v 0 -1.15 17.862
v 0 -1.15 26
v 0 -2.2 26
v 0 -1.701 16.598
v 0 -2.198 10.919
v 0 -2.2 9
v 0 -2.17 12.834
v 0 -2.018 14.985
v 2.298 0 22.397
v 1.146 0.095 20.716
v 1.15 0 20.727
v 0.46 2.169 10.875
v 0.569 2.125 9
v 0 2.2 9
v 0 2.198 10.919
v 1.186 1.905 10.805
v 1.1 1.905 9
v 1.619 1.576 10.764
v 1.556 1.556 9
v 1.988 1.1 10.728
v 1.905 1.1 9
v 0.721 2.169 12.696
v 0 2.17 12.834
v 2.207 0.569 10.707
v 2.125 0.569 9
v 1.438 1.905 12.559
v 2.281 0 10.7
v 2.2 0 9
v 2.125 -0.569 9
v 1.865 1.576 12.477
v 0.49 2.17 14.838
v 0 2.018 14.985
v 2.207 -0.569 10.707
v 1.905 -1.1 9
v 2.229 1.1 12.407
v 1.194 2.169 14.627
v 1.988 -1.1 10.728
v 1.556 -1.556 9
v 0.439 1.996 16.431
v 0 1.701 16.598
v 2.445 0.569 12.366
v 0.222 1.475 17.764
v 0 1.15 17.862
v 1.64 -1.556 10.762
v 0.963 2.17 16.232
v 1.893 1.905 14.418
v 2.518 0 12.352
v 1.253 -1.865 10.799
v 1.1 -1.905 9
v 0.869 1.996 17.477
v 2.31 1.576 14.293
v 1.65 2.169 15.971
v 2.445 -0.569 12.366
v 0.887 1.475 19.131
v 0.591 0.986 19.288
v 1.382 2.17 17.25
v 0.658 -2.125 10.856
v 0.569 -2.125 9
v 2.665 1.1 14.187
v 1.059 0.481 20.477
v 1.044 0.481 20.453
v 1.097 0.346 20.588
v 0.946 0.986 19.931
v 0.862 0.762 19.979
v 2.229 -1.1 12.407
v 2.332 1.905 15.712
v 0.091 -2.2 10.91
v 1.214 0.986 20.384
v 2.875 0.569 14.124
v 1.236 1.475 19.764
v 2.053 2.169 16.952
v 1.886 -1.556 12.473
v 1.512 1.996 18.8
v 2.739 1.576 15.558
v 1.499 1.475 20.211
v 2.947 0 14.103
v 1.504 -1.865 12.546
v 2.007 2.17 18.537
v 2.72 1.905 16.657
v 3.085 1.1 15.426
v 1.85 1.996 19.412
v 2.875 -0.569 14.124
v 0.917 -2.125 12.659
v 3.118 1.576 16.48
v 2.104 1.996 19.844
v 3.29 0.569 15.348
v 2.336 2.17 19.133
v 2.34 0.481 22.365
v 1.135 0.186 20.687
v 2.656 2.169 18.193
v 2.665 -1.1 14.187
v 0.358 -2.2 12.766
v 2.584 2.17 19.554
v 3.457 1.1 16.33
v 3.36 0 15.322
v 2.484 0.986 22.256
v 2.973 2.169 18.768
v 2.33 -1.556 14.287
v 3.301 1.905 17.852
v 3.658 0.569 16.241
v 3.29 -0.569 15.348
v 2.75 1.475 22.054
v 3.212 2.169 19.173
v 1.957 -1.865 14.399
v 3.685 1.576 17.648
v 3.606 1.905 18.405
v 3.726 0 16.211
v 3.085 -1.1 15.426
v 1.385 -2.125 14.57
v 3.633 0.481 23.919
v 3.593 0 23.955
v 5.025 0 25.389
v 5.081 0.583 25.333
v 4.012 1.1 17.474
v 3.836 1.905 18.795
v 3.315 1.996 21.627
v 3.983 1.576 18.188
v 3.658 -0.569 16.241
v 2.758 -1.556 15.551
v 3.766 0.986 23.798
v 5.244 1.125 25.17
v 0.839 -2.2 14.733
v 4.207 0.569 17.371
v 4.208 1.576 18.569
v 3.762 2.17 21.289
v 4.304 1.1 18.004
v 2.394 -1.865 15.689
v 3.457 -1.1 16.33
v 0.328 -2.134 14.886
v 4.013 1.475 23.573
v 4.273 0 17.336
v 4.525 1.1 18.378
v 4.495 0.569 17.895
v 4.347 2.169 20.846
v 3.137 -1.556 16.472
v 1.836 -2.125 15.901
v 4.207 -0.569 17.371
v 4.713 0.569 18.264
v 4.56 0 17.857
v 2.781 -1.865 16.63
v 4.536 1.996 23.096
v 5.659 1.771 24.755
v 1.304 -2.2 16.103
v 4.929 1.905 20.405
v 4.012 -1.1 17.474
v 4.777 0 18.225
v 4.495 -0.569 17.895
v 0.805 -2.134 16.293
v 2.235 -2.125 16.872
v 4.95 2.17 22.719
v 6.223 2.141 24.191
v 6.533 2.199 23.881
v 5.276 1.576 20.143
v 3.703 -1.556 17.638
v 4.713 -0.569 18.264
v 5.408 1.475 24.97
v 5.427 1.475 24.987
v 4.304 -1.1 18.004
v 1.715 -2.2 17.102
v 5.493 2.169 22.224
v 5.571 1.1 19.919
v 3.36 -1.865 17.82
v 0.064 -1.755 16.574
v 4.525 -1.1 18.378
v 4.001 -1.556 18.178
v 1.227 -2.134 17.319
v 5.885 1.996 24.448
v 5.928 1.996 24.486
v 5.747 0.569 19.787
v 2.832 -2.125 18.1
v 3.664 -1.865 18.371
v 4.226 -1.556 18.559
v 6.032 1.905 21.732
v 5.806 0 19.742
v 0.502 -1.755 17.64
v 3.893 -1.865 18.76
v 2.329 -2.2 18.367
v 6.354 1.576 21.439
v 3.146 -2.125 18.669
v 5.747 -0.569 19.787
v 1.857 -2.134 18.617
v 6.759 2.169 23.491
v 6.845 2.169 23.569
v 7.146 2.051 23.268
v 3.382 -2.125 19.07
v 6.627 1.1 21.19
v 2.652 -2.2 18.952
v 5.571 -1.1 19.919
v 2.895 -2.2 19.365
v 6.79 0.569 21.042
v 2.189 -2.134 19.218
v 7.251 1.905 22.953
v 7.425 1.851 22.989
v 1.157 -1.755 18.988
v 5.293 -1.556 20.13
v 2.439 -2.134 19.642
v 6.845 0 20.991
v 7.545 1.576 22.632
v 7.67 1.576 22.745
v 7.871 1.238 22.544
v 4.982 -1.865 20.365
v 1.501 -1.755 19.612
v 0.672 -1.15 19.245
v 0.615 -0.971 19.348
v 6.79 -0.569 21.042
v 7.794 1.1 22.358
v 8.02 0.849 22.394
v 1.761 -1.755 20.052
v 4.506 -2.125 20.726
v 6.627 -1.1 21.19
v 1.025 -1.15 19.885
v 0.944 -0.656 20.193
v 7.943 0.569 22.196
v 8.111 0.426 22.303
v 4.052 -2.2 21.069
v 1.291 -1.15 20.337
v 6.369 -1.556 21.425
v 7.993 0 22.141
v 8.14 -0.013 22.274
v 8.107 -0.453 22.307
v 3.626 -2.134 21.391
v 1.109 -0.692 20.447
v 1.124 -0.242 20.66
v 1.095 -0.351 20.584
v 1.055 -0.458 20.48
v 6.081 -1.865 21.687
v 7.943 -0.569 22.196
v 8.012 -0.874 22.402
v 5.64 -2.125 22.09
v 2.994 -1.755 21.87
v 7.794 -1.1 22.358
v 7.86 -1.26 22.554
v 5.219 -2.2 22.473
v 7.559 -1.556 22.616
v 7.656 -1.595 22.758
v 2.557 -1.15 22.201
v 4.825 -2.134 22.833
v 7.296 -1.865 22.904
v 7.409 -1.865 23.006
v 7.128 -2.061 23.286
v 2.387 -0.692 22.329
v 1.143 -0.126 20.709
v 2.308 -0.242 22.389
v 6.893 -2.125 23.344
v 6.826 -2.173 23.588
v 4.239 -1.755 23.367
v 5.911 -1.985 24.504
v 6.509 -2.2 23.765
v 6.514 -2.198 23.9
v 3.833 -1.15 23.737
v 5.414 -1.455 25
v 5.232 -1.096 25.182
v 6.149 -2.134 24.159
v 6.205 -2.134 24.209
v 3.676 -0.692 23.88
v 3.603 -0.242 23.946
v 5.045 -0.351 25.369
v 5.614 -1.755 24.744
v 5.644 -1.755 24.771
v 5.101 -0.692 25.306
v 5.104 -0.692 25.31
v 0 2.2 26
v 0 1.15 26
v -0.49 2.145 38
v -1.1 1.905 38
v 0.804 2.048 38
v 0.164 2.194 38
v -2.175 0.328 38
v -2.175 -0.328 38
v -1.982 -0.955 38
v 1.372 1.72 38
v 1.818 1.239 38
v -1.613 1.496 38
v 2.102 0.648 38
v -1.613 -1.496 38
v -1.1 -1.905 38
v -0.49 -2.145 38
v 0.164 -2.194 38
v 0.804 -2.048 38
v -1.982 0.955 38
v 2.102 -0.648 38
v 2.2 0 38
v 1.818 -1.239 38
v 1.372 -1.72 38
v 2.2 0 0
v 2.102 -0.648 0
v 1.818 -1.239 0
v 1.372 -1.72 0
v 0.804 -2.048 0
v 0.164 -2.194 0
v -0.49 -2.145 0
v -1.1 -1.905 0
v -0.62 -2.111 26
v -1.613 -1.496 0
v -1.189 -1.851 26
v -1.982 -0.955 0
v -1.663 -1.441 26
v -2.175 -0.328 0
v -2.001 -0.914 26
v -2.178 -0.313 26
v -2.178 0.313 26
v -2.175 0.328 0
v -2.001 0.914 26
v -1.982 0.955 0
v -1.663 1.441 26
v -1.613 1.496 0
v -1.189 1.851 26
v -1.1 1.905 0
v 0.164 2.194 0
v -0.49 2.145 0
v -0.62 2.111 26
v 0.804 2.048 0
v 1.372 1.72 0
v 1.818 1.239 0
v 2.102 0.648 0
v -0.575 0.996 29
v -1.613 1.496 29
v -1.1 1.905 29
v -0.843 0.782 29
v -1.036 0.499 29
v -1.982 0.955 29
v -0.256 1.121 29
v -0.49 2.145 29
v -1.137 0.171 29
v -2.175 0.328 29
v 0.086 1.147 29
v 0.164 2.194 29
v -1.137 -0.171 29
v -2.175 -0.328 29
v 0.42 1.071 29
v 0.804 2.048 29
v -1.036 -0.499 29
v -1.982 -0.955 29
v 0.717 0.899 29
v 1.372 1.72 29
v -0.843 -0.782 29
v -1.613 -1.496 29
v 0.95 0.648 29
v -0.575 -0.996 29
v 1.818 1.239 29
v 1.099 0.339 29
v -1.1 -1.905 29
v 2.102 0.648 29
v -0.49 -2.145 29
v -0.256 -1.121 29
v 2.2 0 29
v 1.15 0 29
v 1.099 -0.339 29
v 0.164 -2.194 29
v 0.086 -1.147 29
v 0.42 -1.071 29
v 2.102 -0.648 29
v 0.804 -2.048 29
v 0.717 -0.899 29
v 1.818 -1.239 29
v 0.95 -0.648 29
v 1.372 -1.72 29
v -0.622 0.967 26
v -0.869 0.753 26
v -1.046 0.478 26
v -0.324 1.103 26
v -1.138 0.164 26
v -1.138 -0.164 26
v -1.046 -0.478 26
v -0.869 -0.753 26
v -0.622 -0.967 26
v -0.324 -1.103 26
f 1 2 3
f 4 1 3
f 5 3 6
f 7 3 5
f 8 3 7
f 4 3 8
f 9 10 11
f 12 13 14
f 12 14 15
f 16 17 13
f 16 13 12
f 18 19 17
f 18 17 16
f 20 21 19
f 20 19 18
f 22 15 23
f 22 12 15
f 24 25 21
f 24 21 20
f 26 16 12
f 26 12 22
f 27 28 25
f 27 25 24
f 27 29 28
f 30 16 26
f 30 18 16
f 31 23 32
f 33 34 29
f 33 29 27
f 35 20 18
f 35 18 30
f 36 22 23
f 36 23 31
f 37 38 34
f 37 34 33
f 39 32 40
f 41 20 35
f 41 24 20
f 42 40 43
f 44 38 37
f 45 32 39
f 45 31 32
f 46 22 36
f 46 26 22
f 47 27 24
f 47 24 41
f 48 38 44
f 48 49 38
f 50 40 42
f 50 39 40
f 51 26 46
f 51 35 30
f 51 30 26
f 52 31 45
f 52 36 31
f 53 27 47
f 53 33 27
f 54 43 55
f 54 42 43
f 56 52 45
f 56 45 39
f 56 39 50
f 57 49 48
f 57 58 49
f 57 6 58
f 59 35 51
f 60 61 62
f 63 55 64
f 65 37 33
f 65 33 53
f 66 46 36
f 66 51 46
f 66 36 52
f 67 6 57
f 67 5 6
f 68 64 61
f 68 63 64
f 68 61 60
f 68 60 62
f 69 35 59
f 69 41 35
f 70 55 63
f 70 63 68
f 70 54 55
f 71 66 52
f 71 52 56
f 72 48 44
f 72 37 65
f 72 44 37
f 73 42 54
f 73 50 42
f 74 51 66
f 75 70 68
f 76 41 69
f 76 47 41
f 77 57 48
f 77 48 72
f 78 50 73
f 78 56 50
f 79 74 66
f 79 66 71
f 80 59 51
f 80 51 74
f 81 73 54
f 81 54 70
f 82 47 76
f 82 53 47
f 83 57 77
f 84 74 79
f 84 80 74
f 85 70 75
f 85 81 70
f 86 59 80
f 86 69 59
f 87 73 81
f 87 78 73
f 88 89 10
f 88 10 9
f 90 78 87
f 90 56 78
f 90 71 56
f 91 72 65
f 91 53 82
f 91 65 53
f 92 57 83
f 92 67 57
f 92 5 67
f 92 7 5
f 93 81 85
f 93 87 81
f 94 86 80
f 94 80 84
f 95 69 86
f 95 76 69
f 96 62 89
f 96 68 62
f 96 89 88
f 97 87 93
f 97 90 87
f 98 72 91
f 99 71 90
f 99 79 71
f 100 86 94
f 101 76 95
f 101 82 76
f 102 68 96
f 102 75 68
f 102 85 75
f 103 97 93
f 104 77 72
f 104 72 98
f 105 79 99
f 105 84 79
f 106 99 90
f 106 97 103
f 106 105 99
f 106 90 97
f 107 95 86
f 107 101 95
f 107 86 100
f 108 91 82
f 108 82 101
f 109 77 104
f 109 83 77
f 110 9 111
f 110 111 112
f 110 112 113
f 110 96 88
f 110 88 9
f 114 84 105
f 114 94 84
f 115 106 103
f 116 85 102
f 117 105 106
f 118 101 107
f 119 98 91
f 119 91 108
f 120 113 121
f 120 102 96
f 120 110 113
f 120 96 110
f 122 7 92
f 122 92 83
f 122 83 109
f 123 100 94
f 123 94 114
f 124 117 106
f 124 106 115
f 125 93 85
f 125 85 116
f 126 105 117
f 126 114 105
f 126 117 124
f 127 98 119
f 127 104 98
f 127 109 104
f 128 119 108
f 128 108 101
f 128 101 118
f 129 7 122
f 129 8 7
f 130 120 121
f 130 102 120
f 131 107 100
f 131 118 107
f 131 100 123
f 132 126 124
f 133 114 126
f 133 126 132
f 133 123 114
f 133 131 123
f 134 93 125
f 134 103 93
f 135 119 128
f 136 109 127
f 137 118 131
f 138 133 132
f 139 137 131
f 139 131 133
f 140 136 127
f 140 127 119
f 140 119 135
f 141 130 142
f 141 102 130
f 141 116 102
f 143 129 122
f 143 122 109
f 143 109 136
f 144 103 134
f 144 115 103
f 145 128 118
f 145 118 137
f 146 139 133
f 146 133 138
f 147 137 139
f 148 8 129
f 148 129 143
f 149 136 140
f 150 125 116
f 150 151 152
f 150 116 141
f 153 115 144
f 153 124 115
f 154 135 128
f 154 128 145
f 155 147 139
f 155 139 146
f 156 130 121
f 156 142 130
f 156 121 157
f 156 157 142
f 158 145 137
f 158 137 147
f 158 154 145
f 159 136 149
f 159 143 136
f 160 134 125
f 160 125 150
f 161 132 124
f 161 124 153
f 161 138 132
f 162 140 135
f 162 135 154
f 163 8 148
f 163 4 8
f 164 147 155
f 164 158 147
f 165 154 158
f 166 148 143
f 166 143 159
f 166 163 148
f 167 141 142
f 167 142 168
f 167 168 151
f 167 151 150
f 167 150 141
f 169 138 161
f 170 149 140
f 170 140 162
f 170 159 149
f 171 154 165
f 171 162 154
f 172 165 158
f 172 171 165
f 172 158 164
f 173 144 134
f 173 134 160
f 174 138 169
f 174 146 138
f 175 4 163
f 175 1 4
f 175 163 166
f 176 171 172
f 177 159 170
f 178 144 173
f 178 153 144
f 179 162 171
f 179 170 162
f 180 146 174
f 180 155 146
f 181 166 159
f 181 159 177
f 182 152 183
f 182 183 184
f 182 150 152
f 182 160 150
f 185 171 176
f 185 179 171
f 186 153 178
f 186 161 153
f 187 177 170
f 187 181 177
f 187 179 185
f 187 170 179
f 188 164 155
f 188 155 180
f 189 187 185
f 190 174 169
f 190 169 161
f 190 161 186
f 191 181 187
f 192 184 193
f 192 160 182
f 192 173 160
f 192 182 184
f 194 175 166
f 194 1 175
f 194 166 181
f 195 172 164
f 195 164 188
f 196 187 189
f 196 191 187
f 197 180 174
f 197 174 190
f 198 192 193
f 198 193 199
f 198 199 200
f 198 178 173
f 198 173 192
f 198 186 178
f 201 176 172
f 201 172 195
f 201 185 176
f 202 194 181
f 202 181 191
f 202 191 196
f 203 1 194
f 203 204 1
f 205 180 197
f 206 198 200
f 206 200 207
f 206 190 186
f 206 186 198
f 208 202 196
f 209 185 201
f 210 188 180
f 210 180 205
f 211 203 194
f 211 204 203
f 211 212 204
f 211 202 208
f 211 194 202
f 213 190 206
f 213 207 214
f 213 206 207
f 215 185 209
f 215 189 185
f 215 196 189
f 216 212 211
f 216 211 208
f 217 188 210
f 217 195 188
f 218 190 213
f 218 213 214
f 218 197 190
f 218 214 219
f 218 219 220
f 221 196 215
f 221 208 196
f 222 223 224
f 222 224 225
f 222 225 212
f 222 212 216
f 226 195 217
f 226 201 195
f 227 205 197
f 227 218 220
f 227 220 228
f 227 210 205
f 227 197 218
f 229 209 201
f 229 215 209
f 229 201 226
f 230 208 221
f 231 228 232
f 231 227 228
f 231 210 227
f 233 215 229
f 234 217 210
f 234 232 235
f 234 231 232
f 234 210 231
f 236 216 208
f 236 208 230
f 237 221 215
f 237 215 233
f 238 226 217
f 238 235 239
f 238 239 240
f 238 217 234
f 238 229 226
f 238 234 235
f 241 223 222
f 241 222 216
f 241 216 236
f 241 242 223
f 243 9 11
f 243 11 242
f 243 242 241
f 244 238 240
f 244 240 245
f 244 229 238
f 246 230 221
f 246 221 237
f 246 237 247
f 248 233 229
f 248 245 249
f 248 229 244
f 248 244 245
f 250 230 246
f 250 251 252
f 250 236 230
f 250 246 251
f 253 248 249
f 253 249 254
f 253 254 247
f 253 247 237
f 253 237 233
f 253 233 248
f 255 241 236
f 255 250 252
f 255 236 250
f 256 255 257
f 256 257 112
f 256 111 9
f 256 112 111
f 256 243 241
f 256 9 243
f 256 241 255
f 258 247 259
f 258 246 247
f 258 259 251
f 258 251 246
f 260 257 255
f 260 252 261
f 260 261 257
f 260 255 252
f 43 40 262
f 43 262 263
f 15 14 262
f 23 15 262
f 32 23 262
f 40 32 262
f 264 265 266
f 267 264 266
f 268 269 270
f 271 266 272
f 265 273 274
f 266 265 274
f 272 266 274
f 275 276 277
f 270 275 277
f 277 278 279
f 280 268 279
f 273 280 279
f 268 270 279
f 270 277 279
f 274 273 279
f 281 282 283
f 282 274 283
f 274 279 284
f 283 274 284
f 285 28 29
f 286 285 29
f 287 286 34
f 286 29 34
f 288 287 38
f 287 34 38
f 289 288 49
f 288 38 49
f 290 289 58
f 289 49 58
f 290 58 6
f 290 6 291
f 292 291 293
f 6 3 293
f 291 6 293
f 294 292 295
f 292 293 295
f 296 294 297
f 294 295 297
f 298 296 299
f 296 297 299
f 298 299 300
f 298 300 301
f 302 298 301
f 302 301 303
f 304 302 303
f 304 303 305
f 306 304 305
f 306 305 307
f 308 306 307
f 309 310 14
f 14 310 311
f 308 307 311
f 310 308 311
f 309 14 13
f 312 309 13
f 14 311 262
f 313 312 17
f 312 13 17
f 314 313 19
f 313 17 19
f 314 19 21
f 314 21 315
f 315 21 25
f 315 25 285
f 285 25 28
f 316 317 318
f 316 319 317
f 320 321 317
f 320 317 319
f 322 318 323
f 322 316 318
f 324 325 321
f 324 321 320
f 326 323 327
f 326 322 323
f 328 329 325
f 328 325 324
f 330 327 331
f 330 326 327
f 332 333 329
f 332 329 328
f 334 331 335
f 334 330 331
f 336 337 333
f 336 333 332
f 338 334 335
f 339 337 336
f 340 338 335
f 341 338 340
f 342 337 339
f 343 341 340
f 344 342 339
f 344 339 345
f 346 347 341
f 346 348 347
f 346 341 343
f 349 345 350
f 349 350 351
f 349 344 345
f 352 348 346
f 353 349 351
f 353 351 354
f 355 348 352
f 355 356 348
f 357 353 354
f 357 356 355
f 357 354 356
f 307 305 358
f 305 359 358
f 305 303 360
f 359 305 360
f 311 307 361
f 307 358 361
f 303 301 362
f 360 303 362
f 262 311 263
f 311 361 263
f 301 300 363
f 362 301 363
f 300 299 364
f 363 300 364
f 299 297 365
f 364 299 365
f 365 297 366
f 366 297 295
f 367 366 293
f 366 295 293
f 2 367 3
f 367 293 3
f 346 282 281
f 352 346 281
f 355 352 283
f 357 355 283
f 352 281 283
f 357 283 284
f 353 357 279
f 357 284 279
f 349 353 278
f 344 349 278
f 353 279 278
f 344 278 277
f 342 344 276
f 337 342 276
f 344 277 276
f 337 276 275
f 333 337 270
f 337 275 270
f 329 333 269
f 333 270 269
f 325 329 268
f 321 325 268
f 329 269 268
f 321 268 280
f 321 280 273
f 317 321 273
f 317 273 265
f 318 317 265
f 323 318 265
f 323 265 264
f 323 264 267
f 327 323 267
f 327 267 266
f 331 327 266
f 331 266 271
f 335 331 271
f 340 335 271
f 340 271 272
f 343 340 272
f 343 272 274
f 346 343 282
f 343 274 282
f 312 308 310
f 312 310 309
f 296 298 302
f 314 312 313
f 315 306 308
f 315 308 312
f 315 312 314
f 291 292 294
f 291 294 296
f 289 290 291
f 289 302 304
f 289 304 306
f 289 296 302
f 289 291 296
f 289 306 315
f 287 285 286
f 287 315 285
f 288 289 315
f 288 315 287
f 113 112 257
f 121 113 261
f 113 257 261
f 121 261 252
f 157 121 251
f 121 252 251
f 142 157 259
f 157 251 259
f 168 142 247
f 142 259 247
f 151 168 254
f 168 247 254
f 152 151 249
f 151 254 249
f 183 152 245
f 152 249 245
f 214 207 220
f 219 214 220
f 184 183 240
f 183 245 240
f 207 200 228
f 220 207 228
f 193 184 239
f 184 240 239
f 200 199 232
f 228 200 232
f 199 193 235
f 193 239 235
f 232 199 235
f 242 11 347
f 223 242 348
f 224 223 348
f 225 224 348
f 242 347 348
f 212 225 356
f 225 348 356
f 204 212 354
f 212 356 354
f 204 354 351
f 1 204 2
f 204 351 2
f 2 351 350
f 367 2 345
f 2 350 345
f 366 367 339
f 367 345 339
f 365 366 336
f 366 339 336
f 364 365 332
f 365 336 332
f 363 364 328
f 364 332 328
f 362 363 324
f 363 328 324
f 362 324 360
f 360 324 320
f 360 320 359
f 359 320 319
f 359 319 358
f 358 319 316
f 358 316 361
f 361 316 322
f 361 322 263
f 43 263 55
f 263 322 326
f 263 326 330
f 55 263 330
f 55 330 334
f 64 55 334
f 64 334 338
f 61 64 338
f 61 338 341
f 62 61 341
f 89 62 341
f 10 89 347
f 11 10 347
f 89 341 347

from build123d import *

# Parameters (mm, degrees)
BOX001027045134_W         = 10
BOX001027045134_H         = 10
BOX001027045134_DEPTH     = 32
CYLINDER192_R             = 2.2
CYLINDER192_DEPTH         = 17
CUT158_PLACEMENT_ANGLE    = 180
BOX001027045133_W         = 10
BOX001027045133_H         = 10
BOX001027045133_DEPTH     = 32
BOX001027045132_W         = 15
BOX001027045132_H         = 10
BOX001027045132_DEPTH     = 18
BOX001027045135_W         = 25
BOX001027045135_H         = 10
BOX001027045135_DEPTH     = 25
TORUS013_R                = 2.2
TORUS013_ROLL_ANGLE       = 90
COMMON091_PITCH_ANGLE     = -45
COMMON090_PLACEMENT_ANGLE = 180
CYLINDER191_R             = 2.2
CYLINDER191_DEPTH         = 9
CYLINDER193_R             = 2.2
CYLINDER193_DEPTH         = 9
CYLINDER190_R             = 1.15
CYLINDER190_DEPTH         = 32


with BuildPart() as cube187:
    # Box001027045134 → Box001027045134 (new body)
    with BuildSketch(Plane(origin=(0, -5, -22), x_dir=(1, 0, 0), z_dir=(0, 0, 1))):
        with Locations((5, 5)):
            Rectangle(BOX001027045134_W, BOX001027045134_H)
    extrude(amount=BOX001027045134_DEPTH)


with BuildPart() as cut158:
    # Cylinder192 → Cylinder192 (new body)
    with BuildSketch(Plane.XY.offset(-15)):
        Circle(CYLINDER192_R)
    extrude(amount=CYLINDER192_DEPTH)

    # Cut158: cut Cube187
    add(cube187.part, mode=Mode.SUBTRACT)


with BuildPart() as cut158_1:
    # Cut158 placement: moved
    add(cut158.part.moved(Location((0, 0, 6))).rotate(Axis((0, 0, 6), (1, 0, 0)), CUT158_PLACEMENT_ANGLE))


with BuildPart() as cube186:
    # Box001027045133 → Box001027045133 (new body)
    with BuildSketch(Plane(origin=(0, -5, -22), x_dir=(1, 0, 0), z_dir=(0, 0, 1))):
        with Locations((5, 5)):
            Rectangle(BOX001027045133_W, BOX001027045133_H)
    extrude(amount=BOX001027045133_DEPTH)


with BuildPart() as cube185:
    # Box001027045132 → Box001027045132 (new body)
    with BuildSketch(Plane(origin=(-5, -5, -18), x_dir=(1, 0, 0), z_dir=(0, 0, 1))):
        with Locations((7.5, 5)):
            Rectangle(BOX001027045132_W, BOX001027045132_H)
    extrude(amount=BOX001027045132_DEPTH)


with BuildPart() as cube188:
    # Box001027045135 → Box001027045135 (new body)
    with BuildSketch(Plane(origin=(-3, -5, -1), x_dir=(1, 0, 0), z_dir=(0, 0, 1))):
        with Locations((12.5, 5)):
            Rectangle(BOX001027045135_W, BOX001027045135_H)
    extrude(amount=BOX001027045135_DEPTH)


with BuildPart() as common090:
    # Torus013 → Torus013 (revolve)
    with BuildSketch(Plane.XZ):
        with Locations((20, 0)):
            Circle(TORUS013_R)
    revolve(axis=Axis((0, 0, 0), (0, 0, 1)))


with BuildPart() as common090_1:
    # Torus013 roll: moved
    add(common090.part.rotate(Axis((0, 0, 0), (1, 0, 0)), TORUS013_ROLL_ANGLE))


with BuildPart() as common090_2:
    # Torus013 placement: moved
    add(common090_1.part.moved(Location((20, 0, 0))))

    # Common091: intersect Cube188
    add(cube188.part, mode=Mode.INTERSECT)


with BuildPart() as common090_3:
    # Common091 pitch: moved
    add(common090_2.part.rotate(Axis((0, 0, 0), (0, 1, 0)), COMMON091_PITCH_ANGLE))


with BuildPart() as common090_4:
    # Common091 placement: moved
    add(common090_3.part.moved(Location((5.857864, 0, -14.142136))))

    # Common089: intersect Cube185
    add(cube185.part, mode=Mode.INTERSECT)

    # Common090: intersect Cube186
    add(cube186.part, mode=Mode.INTERSECT)


with BuildPart() as common090_5:
    # Common090 placement: moved
    add(common090_4.part.moved(Location((0, 0, 4))).rotate(Axis((0, 0, 4), (1, 0, 0)), COMMON090_PLACEMENT_ANGLE))


with BuildPart() as cylinder238:
    # Cylinder191 → Cylinder191 (new body)
    with BuildSketch(Plane(origin=(0, 0, 4), x_dir=(1, 0, 0), z_dir=(0, 0, -1))):
        Circle(CYLINDER191_R)
    extrude(amount=CYLINDER191_DEPTH)


with BuildPart() as cylinder240:
    # Cylinder193 → Cylinder193 (new body)
    with BuildSketch(Plane(origin=(0, 0, 33), x_dir=(1, 0, 0), z_dir=(0, 0, -1))):
        Circle(CYLINDER193_R)
    extrude(amount=CYLINDER193_DEPTH)


with BuildPart() as filament_path001:
    # Cylinder190 → Cylinder190 (new body)
    with BuildSketch(Plane(origin=(0, 0, 30), x_dir=(1, 0, 0), z_dir=(0, 0, -1))):
        Circle(CYLINDER190_R)
    extrude(amount=CYLINDER190_DEPTH)

    # Fusion112082: union Cut158, Common090, Cylinder238, Cylinder240
    add(cut158_1.part)
    add(common090_5.part)
    add(cylinder238.part)
    add(cylinder240.part)


with BuildPart() as filament_path001_1:
    # Fusion112082 placement: moved
    add(filament_path001.part.moved(Location((0, 0, 5))))


solid = filament_path001_1.part
